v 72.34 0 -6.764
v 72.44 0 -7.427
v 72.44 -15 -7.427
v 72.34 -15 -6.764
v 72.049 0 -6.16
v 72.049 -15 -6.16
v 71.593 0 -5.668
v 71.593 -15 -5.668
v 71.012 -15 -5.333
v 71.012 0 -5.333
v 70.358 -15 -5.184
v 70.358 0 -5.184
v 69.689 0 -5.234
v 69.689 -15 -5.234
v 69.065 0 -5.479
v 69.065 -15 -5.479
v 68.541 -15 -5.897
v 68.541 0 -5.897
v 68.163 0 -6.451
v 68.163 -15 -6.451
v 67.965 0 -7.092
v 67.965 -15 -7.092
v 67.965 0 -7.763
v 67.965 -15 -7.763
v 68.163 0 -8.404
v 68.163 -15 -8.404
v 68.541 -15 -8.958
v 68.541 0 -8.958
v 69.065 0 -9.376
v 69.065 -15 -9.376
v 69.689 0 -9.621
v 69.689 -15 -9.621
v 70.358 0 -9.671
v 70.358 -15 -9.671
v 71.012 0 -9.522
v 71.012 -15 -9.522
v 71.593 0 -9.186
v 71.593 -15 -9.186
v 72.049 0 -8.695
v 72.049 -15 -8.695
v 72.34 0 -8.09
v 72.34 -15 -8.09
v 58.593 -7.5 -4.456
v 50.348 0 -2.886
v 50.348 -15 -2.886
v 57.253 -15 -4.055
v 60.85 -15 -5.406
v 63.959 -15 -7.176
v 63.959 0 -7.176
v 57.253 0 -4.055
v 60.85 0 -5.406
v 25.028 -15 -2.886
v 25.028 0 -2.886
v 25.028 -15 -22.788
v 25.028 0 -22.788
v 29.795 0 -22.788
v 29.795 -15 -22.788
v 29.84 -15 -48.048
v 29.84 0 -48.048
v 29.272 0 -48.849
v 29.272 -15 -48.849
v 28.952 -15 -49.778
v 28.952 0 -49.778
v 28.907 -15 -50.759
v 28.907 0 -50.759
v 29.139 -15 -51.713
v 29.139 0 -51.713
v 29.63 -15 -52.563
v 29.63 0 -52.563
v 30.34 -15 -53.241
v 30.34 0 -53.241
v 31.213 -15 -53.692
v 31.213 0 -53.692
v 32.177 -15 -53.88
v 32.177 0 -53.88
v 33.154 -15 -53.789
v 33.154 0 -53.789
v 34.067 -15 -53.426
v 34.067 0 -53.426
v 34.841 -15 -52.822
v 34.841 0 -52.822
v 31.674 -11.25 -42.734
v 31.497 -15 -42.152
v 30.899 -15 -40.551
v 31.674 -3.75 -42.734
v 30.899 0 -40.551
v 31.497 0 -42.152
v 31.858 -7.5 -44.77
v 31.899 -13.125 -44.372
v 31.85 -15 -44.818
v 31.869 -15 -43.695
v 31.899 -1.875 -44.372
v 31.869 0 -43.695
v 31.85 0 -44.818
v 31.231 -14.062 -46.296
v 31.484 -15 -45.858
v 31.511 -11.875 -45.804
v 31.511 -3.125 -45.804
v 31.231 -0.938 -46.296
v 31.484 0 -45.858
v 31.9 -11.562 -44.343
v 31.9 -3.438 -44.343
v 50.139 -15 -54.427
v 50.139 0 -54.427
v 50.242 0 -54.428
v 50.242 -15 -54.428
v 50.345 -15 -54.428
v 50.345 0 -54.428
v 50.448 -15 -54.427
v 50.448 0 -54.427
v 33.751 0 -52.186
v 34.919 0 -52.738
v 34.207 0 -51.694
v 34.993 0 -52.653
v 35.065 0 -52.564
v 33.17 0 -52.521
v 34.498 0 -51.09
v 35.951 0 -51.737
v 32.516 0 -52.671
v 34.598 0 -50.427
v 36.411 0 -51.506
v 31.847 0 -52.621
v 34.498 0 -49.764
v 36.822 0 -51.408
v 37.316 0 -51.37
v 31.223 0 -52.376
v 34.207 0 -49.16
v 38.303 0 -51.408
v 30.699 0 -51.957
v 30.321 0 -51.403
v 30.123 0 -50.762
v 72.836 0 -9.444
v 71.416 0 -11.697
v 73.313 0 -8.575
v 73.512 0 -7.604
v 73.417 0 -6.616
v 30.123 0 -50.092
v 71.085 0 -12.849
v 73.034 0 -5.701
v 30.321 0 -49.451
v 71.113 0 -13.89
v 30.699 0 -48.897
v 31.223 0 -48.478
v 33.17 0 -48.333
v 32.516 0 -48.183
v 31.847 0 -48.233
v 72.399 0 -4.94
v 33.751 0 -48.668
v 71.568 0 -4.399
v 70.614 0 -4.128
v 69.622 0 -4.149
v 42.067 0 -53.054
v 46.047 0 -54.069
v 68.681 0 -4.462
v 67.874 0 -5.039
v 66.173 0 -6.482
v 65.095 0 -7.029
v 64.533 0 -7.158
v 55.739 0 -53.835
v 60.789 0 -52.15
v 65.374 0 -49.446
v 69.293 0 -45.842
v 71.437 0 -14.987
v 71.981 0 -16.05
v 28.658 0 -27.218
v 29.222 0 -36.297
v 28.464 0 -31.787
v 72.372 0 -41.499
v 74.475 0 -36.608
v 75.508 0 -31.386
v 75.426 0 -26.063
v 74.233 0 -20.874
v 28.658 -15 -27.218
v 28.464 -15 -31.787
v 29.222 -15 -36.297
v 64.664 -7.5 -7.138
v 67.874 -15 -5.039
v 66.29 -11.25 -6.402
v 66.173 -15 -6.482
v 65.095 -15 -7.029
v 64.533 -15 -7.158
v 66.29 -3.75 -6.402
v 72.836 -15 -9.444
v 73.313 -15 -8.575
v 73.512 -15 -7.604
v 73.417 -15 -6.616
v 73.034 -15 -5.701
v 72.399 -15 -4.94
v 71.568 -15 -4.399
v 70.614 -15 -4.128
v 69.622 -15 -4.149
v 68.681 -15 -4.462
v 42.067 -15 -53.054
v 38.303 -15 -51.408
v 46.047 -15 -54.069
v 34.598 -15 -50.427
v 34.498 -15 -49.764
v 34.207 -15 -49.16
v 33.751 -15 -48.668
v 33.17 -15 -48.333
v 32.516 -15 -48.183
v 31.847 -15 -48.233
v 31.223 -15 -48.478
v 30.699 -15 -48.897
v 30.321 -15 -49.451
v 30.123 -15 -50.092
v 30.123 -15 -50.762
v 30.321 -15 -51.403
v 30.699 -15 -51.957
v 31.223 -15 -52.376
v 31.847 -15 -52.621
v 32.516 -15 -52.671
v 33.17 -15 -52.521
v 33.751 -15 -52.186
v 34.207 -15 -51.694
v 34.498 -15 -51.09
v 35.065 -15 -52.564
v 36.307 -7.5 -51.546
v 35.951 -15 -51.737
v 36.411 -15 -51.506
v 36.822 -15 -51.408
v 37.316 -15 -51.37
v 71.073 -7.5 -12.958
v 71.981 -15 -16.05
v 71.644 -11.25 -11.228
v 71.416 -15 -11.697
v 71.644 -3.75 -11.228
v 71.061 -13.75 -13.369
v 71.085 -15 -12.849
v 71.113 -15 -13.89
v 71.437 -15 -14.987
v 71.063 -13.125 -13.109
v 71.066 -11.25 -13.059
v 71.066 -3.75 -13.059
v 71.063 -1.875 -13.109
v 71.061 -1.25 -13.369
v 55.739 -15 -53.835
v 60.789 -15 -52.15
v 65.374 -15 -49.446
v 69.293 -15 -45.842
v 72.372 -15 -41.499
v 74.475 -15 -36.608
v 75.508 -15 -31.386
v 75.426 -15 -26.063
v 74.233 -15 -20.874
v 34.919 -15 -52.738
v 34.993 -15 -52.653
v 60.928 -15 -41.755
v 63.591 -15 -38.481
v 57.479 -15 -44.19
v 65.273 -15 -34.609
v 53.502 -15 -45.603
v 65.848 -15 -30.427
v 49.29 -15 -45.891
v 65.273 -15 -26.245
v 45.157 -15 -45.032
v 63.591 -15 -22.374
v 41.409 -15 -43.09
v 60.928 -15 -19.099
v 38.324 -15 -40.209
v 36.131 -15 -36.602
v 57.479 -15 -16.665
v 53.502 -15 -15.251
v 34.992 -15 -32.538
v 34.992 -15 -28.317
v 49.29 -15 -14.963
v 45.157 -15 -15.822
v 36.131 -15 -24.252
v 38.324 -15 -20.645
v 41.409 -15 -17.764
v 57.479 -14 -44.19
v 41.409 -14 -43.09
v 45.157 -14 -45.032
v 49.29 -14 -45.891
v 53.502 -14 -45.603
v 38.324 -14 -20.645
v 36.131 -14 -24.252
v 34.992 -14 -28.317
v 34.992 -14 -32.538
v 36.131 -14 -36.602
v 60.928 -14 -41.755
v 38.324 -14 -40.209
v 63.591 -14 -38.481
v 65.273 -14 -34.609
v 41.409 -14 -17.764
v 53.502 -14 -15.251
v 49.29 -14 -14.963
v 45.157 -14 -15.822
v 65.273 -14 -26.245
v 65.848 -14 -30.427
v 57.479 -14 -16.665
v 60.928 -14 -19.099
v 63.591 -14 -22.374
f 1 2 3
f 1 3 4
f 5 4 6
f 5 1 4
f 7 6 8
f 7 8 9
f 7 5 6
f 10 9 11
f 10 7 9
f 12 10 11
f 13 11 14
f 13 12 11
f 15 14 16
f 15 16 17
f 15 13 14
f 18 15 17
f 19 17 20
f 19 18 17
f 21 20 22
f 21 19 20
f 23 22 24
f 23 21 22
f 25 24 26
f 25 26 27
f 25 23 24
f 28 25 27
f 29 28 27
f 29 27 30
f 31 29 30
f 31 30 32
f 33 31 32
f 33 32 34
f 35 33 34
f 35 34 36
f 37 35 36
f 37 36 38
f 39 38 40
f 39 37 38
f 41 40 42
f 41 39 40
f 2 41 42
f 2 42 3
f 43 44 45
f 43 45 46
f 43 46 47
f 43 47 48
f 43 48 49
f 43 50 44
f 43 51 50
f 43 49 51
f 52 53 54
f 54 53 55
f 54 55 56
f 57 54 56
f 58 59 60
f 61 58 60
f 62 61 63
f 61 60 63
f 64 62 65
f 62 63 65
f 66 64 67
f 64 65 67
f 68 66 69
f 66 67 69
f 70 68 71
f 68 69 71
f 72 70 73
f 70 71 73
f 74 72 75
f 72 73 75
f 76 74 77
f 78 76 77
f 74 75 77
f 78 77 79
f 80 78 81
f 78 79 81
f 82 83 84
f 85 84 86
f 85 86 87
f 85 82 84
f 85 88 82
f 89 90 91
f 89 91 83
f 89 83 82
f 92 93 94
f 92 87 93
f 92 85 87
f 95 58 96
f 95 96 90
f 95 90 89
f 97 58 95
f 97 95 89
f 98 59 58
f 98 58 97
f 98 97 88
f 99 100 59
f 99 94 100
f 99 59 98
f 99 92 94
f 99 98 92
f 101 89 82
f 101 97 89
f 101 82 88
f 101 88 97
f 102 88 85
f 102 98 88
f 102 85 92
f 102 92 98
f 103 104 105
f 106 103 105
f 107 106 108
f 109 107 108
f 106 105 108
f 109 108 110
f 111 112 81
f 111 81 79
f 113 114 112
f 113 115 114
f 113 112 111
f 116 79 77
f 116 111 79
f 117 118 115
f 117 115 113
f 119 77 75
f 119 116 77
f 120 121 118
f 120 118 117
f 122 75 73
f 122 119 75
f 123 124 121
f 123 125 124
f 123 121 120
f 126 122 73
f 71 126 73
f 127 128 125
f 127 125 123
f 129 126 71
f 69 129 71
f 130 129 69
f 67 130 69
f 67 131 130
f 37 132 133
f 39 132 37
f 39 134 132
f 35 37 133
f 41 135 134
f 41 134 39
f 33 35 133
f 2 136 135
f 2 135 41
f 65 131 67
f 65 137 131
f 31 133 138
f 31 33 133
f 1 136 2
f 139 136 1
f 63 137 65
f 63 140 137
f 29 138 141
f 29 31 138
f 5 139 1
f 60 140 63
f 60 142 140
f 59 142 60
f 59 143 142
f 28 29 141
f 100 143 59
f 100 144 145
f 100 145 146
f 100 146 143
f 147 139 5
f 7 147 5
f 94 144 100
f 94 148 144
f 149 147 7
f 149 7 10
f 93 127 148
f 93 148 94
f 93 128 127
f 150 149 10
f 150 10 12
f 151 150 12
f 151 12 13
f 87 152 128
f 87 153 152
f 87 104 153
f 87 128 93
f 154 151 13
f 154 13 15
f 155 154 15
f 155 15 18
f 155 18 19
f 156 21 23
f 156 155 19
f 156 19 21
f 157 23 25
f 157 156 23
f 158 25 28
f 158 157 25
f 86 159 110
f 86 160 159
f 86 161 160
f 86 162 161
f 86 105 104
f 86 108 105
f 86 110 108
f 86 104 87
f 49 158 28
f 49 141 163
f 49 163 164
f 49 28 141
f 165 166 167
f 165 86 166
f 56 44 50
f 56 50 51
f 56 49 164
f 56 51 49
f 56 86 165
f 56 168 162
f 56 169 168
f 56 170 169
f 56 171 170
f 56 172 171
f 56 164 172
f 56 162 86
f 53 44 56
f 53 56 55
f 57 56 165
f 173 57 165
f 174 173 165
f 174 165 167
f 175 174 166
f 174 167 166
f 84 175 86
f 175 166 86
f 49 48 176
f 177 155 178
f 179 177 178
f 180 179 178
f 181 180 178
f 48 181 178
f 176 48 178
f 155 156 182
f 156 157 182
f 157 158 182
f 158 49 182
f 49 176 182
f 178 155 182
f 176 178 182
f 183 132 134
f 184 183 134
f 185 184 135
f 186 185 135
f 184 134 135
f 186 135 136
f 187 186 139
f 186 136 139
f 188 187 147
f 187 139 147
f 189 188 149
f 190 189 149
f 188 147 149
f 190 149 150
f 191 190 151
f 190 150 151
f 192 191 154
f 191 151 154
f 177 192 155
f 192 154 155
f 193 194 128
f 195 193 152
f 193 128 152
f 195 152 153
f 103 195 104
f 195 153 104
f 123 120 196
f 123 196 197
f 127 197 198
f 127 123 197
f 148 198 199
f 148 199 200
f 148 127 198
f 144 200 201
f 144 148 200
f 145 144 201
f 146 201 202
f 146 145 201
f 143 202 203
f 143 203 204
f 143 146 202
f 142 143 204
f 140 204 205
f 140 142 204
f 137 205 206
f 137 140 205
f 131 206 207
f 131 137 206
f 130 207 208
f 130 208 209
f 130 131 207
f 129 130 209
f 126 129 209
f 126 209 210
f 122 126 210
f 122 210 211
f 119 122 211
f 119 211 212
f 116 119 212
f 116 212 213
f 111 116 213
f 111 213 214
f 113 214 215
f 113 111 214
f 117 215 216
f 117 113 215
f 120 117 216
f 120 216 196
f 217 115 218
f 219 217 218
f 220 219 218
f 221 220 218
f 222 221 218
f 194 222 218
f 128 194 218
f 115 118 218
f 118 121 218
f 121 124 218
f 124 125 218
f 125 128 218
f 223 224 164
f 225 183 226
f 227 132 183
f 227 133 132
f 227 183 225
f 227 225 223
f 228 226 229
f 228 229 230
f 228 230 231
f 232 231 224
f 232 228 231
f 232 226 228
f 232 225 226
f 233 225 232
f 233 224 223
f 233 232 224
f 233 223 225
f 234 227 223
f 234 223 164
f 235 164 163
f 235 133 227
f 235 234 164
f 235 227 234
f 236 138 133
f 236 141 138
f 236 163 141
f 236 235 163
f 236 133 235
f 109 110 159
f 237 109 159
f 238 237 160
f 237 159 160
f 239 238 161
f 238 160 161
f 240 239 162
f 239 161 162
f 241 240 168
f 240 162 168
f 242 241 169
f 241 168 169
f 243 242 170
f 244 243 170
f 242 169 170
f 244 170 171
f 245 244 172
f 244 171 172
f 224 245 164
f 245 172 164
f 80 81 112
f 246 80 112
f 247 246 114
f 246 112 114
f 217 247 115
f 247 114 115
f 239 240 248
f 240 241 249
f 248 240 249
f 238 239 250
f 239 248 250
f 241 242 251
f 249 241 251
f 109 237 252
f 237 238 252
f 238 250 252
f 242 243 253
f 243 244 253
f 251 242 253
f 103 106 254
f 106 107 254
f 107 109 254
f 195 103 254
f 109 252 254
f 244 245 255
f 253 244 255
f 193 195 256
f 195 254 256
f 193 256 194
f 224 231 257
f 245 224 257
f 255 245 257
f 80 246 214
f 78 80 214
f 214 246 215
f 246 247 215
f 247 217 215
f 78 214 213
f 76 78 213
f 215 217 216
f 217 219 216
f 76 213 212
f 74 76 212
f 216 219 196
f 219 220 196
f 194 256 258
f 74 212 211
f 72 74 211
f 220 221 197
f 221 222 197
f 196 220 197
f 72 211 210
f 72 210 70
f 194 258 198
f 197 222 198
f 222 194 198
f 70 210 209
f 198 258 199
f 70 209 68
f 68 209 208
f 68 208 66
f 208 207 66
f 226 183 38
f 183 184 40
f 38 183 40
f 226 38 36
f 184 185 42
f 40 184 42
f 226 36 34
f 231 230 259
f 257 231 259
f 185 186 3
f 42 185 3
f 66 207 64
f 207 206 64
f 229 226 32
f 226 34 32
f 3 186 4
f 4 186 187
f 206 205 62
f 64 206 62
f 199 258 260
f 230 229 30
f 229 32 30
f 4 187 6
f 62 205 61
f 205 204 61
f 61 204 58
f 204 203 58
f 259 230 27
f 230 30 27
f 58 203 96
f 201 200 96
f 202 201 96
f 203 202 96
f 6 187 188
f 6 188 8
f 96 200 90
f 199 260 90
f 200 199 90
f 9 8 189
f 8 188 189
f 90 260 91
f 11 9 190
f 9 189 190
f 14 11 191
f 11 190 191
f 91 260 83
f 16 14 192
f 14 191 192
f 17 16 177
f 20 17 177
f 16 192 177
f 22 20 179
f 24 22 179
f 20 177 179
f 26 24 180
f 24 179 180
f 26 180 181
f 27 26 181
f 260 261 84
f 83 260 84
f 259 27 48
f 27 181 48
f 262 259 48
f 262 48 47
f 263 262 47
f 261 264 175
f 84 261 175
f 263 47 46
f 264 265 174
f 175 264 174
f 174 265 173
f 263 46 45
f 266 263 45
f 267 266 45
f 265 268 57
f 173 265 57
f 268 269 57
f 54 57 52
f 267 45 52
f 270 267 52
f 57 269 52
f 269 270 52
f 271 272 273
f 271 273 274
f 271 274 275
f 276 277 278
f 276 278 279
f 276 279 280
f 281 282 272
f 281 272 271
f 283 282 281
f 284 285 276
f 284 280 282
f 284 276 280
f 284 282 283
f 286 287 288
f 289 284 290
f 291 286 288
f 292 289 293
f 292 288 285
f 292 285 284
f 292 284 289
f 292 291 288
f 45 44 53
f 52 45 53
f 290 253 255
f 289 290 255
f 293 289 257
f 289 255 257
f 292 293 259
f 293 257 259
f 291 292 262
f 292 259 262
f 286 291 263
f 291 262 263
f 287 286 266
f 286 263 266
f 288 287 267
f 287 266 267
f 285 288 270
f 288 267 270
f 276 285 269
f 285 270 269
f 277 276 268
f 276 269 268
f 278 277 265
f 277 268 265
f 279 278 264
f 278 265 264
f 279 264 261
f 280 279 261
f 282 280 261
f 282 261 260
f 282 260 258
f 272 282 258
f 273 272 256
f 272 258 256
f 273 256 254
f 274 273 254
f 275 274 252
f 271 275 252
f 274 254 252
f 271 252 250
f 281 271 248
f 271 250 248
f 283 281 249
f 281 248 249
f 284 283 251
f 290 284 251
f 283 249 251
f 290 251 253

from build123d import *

# Parameters (mm, degrees)
F0_R     = 2.25
F1_DEPTH = 15
F2_R     = 15.5
F3_DEPTH = 1


with BuildPart() as f1:
    # F0 (on Front) → F1 (new body)
    with BuildSketch(Plane.XZ):
        with BuildLine():
            add(Edge.make_bspline(
                [(50.3479777806, -2.8862454928), (53.268195878, -3.261348037), (58.6611963596, -3.9533176417), (62.2933460238, -6.1636902612), (63.9588082608, -7.1761531808)],
                knots=[0, 0, 0, 0, 0.5415192792, 1, 1, 1, 1], degree=3))
            Line((50.3479777806, -2.8862454928), (25.0282175839, -2.8862454928))
            Line((25.0282175839, -2.8862454928), (25.0282175839, -22.7884277701))
            Line((25.0282175839, -22.7884277701), (29.7951731688, -22.7884277701))
            ThreePointArc((29.7951731688, -22.7884277701), (28.4636985284, -31.7867677512), (30.8986199162, -40.5511333853))
            add(Edge.make_bspline(
                [(29.8397061446, -48.0479822571), (30.7470532857, -47.0116302158), (32.6276335059, -44.8769054108), (31.4765020534, -42.024639753), (30.8986199162, -40.5511333853)],
                knots=[0, 0, 0, 0, 0.485392469, 1, 1, 1, 1], degree=3))
            ThreePointArc((29.8397061446, -48.0479822571), (29.9610414714, -52.9277231917), (34.8411419508, -52.8218309708))
            add(Edge.make_bspline(
                [(34.8411419508, -52.8218309708), (34.9156373522, -52.7356864932), (34.9901022249, -52.6494127513), (35.065109933, -52.5643533984)],
                knots=[0, 0, 0, 0, 0.0825218812, 0.0825218812, 0.0825218812, 0.0825218812], degree=3))
            add(Edge.make_bspline(
                [(35.065109933, -52.5643533984), (35.4412326082, -52.1378272164), (36.3054316166, -51.2598405123), (37.5921223548, -51.3648089629), (38.303234242, -51.4084192455)],
                knots=[0.0825218812, 0.0825218812, 0.0825218812, 0.0825218812, 0.4963240293, 1, 1, 1, 1], degree=3))
            ThreePointArc((38.303234242, -51.4084192455), (44.0362215273, -53.6423292578), (50.1387902983, -54.4272824743))
            Line((50.1387902983, -54.4272824743), (50.4479777806, -54.4272824743))
            ThreePointArc((50.4479777806, -54.4272824743), (72.3721230889, -41.4992868245), (71.9812678774, -16.0503487087))
            add(Edge.make_bspline(
                [(72.8356159841, -9.4444898754), (71.9013864052, -10.6696925545), (70.5245996547, -12.8306913276), (71.3883715318, -15.0658070668), (71.9812678774, -16.0503487087)],
                knots=[0, 0, 0, 0, 0.524822635, 1, 1, 1, 1], degree=3))
            ThreePointArc((72.8356159841, -9.4444898754), (72.3990680605, -4.9396508075), (67.8742152822, -5.0389304732))
            add(Edge.make_bspline(
                [(67.8742152822, -5.0389304732), (66.812715433, -6.0682372602), (65.5657418957, -7.1263163681), (64.1965142668, -7.1894367778), (63.9588082608, -7.1761531808)],
                knots=[0, 0, 0, 0, 0.5190595992, 0.6268019641, 0.6268019641, 0.6268019641, 0.6268019641], degree=3))
        make_face()
        with Locations((32.3479777806, -50.4269927665)):
            Circle(F0_R, mode=Mode.SUBTRACT)
        with BuildLine():
            ThreePointArc((50.3479777806, -14.9272824743), (61.308132889, -19.4671273659), (65.8479777806, -30.4272824743))
            ThreePointArc((65.8479777806, -30.4272824743), (39.3878226722, -41.3874375827), (50.3479777806, -14.9272824743))
        make_face(mode=Mode.SUBTRACT)
        with Locations((70.1901335806, -7.4272824743)):
            Circle(F0_R, mode=Mode.SUBTRACT)
        with BuildLine():
            ThreePointArc((50.3479777806, -14.9272824743), (39.3878226722, -41.3874375827), (65.8479777806, -30.4272824743))
            ThreePointArc((65.8479777806, -30.4272824743), (61.308132889, -19.4671273659), (50.3479777806, -14.9272824743))
        make_face()
        with BuildLine():
            ThreePointArc((63.3479777806, -30.4272824743), (41.1555896252, -39.6196706298), (50.3479777806, -17.4272824743))
            ThreePointArc((50.3479777806, -17.4272824743), (59.5403659361, -21.2348943189), (63.3479777806, -30.4272824743))
        make_face(mode=Mode.SUBTRACT)
        with BuildLine():
            ThreePointArc((63.3479777806, -30.4272824743), (59.5403659361, -21.2348943189), (50.3479777806, -17.4272824743))
            ThreePointArc((50.3479777806, -17.4272824743), (41.1555896252, -39.6196706298), (63.3479777806, -30.4272824743))
        make_face()
        with BuildLine():
            add(Edge.make_bspline(
                [(34.8411419508, -52.8218309708), (34.9156373522, -52.7356864932), (34.9901022249, -52.6494127513), (35.065109933, -52.5643533984)],
                knots=[0, 0, 0, 0, 0.0825218812, 0.0825218812, 0.0825218812, 0.0825218812], degree=3))
            ThreePointArc((34.8411419508, -52.8218309708), (34.956304949, -52.6958574577), (35.065109933, -52.5643533984))
        make_face()
        with BuildLine():
            ThreePointArc((50.1387902983, -54.4272824743), (50.2933840395, -54.4277544812), (50.4479777806, -54.4272824743))
            Line((50.4479777806, -54.4272824743), (50.1387902983, -54.4272824743))
        make_face()
    extrude(amount=F1_DEPTH)

    # F2 (on face) → F3 (cut)
    with BuildSketch(Plane.XZ.offset(15)):
        with Locations((50.3479777806, -30.4272824743)):
            Circle(F2_R)
    extrude(amount=-F3_DEPTH, mode=Mode.SUBTRACT)


solid = f1.part
